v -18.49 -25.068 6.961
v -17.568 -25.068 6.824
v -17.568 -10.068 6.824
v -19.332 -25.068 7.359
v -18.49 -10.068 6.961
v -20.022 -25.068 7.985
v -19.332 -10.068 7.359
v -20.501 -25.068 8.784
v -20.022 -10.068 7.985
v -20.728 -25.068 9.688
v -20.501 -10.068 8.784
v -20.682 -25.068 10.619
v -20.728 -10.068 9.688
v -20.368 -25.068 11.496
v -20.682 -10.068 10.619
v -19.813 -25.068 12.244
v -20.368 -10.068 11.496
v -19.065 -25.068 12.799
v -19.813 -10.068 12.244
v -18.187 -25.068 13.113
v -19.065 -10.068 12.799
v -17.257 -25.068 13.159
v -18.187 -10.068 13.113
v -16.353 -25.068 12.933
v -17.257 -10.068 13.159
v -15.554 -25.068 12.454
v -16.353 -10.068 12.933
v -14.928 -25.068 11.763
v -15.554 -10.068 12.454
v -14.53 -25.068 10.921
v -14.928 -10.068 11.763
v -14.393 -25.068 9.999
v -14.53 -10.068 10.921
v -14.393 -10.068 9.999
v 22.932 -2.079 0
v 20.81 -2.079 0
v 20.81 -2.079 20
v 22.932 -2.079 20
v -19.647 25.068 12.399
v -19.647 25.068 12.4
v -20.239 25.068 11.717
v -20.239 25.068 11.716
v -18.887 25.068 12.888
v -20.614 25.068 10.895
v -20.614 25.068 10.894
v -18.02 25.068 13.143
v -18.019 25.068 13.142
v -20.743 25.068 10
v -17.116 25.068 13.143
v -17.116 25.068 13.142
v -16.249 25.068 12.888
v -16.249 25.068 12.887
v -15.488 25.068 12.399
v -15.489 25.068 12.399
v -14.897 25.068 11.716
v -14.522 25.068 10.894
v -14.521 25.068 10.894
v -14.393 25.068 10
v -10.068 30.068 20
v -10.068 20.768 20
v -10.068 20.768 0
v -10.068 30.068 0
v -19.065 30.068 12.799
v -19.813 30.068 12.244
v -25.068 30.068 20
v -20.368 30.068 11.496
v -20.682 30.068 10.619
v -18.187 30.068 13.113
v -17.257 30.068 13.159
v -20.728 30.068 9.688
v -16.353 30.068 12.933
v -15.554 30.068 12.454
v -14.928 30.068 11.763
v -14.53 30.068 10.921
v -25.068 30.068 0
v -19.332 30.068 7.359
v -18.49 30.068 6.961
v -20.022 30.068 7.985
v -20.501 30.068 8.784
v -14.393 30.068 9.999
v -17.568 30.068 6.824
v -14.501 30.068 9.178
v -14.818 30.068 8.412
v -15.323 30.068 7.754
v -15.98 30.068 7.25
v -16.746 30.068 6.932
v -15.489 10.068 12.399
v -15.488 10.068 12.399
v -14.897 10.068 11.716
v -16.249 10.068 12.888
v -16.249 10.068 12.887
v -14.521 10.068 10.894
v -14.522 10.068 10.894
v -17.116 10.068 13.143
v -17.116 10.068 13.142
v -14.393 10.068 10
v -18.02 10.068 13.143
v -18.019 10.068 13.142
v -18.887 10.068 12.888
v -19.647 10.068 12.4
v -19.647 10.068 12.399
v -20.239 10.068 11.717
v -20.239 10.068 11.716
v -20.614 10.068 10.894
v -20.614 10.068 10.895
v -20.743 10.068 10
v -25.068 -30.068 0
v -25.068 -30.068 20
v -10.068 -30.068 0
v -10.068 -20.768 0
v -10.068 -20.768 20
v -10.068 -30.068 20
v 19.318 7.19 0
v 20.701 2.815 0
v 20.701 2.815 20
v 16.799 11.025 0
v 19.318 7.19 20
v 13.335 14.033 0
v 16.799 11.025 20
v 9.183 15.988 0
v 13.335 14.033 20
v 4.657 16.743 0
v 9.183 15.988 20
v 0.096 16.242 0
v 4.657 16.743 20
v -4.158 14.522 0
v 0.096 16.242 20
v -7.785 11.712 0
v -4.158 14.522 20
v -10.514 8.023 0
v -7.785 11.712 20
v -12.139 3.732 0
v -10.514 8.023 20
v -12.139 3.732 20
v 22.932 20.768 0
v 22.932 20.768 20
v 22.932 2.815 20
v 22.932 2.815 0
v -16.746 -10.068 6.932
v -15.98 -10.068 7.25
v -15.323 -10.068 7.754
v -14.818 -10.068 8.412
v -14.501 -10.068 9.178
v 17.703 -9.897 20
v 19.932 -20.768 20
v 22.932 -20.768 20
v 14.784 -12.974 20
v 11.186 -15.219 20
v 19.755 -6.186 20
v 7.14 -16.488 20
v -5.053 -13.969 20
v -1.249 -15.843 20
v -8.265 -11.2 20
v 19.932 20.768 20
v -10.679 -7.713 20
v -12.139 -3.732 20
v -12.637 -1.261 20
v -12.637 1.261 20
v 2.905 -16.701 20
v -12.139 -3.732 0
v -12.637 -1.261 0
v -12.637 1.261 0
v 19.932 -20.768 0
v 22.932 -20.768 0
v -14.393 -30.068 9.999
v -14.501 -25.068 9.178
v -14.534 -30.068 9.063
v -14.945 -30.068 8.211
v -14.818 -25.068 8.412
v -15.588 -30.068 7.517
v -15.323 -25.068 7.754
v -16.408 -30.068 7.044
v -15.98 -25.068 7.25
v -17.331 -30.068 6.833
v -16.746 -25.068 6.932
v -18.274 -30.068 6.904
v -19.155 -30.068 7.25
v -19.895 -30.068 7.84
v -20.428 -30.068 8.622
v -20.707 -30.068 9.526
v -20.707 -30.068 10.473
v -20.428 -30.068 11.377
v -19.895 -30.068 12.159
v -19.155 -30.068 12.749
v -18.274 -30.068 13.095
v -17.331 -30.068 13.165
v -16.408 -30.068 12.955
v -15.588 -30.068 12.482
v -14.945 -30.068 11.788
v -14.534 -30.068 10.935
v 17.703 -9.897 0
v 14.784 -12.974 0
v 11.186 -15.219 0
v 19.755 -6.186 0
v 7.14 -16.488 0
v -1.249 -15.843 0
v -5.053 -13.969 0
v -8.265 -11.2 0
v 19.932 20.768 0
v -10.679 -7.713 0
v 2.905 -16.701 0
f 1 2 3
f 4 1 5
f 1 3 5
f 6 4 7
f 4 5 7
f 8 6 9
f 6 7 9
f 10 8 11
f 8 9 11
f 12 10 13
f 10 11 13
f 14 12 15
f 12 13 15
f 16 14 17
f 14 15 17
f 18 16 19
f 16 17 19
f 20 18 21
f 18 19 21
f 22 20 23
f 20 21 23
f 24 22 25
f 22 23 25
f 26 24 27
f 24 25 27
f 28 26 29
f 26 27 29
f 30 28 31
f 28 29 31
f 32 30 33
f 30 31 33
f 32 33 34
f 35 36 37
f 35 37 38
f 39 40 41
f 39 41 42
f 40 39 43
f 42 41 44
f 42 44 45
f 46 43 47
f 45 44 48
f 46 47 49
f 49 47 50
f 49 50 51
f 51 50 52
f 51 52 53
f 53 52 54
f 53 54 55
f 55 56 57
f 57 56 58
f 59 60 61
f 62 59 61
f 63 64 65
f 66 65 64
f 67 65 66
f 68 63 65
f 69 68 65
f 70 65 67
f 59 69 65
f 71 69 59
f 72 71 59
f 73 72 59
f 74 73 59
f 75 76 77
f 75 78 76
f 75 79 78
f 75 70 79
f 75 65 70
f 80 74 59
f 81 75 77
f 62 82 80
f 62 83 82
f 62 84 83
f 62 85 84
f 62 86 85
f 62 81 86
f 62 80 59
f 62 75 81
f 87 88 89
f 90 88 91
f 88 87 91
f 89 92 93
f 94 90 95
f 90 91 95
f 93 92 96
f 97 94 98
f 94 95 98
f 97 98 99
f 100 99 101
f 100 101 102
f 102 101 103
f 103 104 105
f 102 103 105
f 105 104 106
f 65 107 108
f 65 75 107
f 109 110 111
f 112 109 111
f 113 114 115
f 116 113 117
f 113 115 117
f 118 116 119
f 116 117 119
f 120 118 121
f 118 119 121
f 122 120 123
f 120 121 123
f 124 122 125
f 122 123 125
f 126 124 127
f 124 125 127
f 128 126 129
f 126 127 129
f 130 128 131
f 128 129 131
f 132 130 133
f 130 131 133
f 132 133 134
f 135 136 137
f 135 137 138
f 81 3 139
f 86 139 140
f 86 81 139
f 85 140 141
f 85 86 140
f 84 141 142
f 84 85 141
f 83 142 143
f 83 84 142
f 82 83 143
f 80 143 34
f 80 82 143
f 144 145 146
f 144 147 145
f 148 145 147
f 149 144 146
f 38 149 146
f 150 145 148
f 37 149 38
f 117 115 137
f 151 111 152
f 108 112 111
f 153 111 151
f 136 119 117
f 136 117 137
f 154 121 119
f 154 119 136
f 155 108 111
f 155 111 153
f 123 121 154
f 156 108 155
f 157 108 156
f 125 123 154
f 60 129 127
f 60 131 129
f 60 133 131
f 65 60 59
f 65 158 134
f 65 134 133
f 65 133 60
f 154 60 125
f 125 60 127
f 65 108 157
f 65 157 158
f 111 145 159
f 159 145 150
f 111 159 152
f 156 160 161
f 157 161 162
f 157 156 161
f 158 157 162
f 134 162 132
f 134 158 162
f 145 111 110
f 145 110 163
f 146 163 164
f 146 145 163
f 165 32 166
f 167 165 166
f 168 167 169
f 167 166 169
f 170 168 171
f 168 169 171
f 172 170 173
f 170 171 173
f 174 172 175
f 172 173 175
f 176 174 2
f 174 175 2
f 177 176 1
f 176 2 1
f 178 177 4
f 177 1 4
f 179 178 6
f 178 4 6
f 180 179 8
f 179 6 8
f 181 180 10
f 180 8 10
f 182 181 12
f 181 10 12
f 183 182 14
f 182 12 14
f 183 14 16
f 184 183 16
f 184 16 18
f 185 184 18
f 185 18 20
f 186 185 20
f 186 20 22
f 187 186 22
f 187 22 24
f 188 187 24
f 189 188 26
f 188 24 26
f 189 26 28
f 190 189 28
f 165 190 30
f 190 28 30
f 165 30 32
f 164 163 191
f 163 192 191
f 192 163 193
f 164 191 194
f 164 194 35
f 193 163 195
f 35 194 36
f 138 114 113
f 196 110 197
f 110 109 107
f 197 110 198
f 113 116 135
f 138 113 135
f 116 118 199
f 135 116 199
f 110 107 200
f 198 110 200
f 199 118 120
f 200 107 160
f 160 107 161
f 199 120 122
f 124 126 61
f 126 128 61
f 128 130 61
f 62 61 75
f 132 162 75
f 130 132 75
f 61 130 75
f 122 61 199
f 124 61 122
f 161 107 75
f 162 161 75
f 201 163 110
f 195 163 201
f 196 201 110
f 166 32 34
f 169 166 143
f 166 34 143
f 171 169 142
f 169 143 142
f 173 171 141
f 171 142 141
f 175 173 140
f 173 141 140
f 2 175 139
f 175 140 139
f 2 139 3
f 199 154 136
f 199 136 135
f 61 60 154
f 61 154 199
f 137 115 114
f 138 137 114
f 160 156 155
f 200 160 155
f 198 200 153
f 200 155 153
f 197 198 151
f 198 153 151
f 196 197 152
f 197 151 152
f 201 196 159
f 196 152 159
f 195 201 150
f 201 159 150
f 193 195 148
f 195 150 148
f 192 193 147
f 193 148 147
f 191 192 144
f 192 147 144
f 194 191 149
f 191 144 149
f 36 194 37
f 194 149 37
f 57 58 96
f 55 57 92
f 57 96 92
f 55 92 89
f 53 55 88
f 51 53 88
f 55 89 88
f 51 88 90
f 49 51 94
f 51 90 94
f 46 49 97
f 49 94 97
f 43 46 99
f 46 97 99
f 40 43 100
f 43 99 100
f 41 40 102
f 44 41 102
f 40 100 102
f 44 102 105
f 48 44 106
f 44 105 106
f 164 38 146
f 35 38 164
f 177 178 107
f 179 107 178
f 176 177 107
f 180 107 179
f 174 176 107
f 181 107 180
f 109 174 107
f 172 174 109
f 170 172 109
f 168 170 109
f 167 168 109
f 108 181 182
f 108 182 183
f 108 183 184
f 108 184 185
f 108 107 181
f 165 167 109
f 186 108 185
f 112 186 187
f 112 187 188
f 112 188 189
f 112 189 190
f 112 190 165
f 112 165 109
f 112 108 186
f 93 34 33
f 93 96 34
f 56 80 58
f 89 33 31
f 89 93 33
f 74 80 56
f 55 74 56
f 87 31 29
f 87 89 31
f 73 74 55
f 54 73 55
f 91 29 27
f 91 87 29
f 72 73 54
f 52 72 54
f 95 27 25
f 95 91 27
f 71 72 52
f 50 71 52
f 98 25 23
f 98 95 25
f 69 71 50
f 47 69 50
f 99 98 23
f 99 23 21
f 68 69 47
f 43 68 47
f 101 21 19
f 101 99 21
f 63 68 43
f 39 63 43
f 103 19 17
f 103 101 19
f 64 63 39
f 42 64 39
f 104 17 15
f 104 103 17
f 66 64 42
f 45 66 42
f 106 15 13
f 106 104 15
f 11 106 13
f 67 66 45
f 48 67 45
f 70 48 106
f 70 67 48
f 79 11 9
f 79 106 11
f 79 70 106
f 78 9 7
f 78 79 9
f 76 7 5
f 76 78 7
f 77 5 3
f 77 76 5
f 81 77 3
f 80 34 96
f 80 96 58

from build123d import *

# Parameters (mm, degrees)
CROQUIS1_W              = 40
CROQUIS1_H              = 50.135716494
SALIENTE_EXTRUIR1_DEPTH = 20
CROQUIS2_W              = 25
CROQUIS2_H              = 9.3
CORTAR_EXTRUIR1_DEPTH   = 41.703747176
CROQUIS3_W              = 25
CROQUIS3_H              = 9.3
CORTAR_EXTRUIR2_DEPTH   = 41.703747176
CORTAR_EXTRUIR3_DEPTH   = 41.703747176
CROQUIS5_W              = 12.7
CROQUIS5_H              = 20
TALADRO1_D              = 6.35
TALADRO1_DEPTH          = 15
TALADRO2_D              = 6.35
TALADRO2_DEPTH          = 15
CROQUIS11_W             = 20
CROQUIS11_H             = 12.953152015
CROQUIS11_H_2           = 13.688922843
SALIENTE_EXTRUIR2_DEPTH = 5
CROQUIS12_W             = 15
CROQUIS12_H             = 20
SALIENTE_EXTRUIR3_DEPTH = 5
CORTAR_EXTRUIR4_START   = -76
CROQUIS13_R             = 3.175
CORTAR_EXTRUIR4_DEPTH   = 76
CROQUIS14_W             = 15
CROQUIS14_H             = 20
SALIENTE_EXTRUIR4_DEPTH = 5
CROQUIS15_R             = 3.175
CORTAR_EXTRUIR5_DEPTH   = 72
CROQUIS16_W             = 30
CROQUIS16_H             = 20
SALIENTE_EXTRUIR5_DEPTH = 5
CROQUIS17_W             = 30
CROQUIS17_H             = 20
SALIENTE_EXTRUIR6_DEPTH = 5
CROQUIS20_W             = 20
CROQUIS20_H             = 17.953152015
CROQUIS20_H_2           = 18.688922843
SALIENTE_EXTRUIR7_DEPTH = 3
CROQUIS21_R             = 16.75
CORTAR_EXTRUIR8_DEPTH   = 43


with BuildPart() as part:
    # Croquis1 → Saliente-Extruir1 (new body)
    with BuildSketch(Plane(origin=(0, 0, 0), x_dir=(-1, 0, 0), z_dir=(0, 0, -1))):
        with Locations((5.067858247, 0)):
            Rectangle(CROQUIS1_W, CROQUIS1_H)
    extrude(amount=-SALIENTE_EXTRUIR1_DEPTH)

    # Croquis2 → Cortar-Extruir1 (cut, through all)
    with BuildSketch(Plane.XY.offset(20)):
        with Locations((2.432141753, -20.417858247)):
            Rectangle(CROQUIS2_W, CROQUIS2_H)
    extrude(amount=-CORTAR_EXTRUIR1_DEPTH, mode=Mode.SUBTRACT)

    # Croquis3 → Cortar-Extruir2 (cut, through all)
    with BuildSketch(Plane.XY.offset(20)):
        with Locations((2.432141753, 20.417858247)):
            Rectangle(CROQUIS3_W, CROQUIS3_H)
    extrude(amount=-CORTAR_EXTRUIR2_DEPTH, mode=Mode.SUBTRACT)

    # Croquis4 → Cortar-Extruir3 (cut, through all)
    with BuildSketch(Plane.XY.offset(20)):
        with BuildLine():
            Line((14.932141753, 2.814706232), (12.384160401, 2.814706232))
            ThreePointArc((12.384160401, 2.814706232), (12.694464867, 0.374915654), (12.528688183, -2.078935404))
            Line((12.528688183, -2.078935404), (14.932141753, -2.078935404))
            Line((14.932141753, -2.078935404), (14.932141753, 2.814706232))
        make_face()
    extrude(amount=-CORTAR_EXTRUIR3_DEPTH, mode=Mode.SUBTRACT)

    # Croquis5 → Cortar-Revolución1 (revolve, cut)
    with BuildSketch(Plane.XZ):
        with Locations((6.35, 10)):
            Rectangle(CROQUIS5_W, CROQUIS5_H)
    revolve(axis=Axis((0, 0, 20), (0, 0, -1)), mode=Mode.SUBTRACT)

    # Taladro1
    with Locations(Plane(origin=(0, -25.067858247, 0), x_dir=(-1, 0, 0), z_dir=(0, -1, 0))):
        with Locations((17.567858247, -9.999290914)):
            Hole(TALADRO1_D / 2, depth=TALADRO1_DEPTH)

    # Taladro2
    with Locations(Plane(origin=(0, 25.067858247, 0), x_dir=(1, 0, 0), z_dir=(0, 1, 0))):
        with Locations((-17.567858247, -10)):
            Hole(TALADRO2_D / 2, depth=TALADRO2_DEPTH)

    # Croquis11 → Saliente-Extruir2 (add)
    with BuildSketch(Plane(origin=(14.932141753, 0, 0), x_dir=(0, 0, -1), z_dir=(1, 0, 0))):
        with Locations((-10, 9.29128224)):
            Rectangle(CROQUIS11_W, CROQUIS11_H)
        with Locations((-10, -8.923396826)):
            Rectangle(CROQUIS11_W, CROQUIS11_H_2)
    extrude(amount=SALIENTE_EXTRUIR2_DEPTH)

    # Croquis12 → Saliente-Extruir3 (add)
    with BuildSketch(Plane(origin=(0, 25.067858247, 0), x_dir=(1, 0, 0), z_dir=(0, 1, 0))):
        with Locations((-17.567858247, -10)):
            Rectangle(CROQUIS12_W, CROQUIS12_H)
    extrude(amount=SALIENTE_EXTRUIR3_DEPTH)

    # Croquis13 → Cortar-Extruir4 (cut)
    with BuildSketch(Plane.XZ.offset(25.067858247).offset(CORTAR_EXTRUIR4_START)):
        with Locations(Location((-17.567858247, 9.999290914, 0), (0, 0, 270))):
            Circle(CROQUIS13_R)
    extrude(amount=CORTAR_EXTRUIR4_DEPTH, mode=Mode.SUBTRACT)

    # Croquis14 → Saliente-Extruir4 (add)
    with BuildSketch(Plane.XZ.offset(25.067858247)):
        with Locations((-17.567858247, 10)):
            Rectangle(CROQUIS14_W, CROQUIS14_H)
    extrude(amount=SALIENTE_EXTRUIR4_DEPTH)

    # Croquis15 → Cortar-Extruir5 (cut)
    with BuildSketch(Plane(origin=(0, 30.067858247, 0), x_dir=(1, 0, 0), z_dir=(0, 1, 0))):
        with Locations((-17.567858247, -9.999290914)):
            Circle(CROQUIS15_R)
    extrude(amount=-CORTAR_EXTRUIR5_DEPTH, mode=Mode.SUBTRACT)

    # Croquis16 → Saliente-Extruir5 (add)
    with BuildSketch(Plane(origin=(0, 15.767858247, 0), x_dir=(1, 0, 0), z_dir=(0, 1, 0))):
        with Locations((4.932141753, -10)):
            Rectangle(CROQUIS16_W, CROQUIS16_H)
    extrude(amount=SALIENTE_EXTRUIR5_DEPTH)

    # Croquis17 → Saliente-Extruir6 (add)
    with BuildSketch(Plane.XZ.offset(15.767858247)):
        with Locations((4.932141753, 10)):
            Rectangle(CROQUIS17_W, CROQUIS17_H)
    extrude(amount=SALIENTE_EXTRUIR6_DEPTH)

    # Croquis20 → Saliente-Extruir7 (add)
    with BuildSketch(Plane(origin=(19.932141753, 0, 0), x_dir=(0, 0, -1), z_dir=(1, 0, 0))):
        with Locations((-10, 11.79128224)):
            Rectangle(CROQUIS20_W, CROQUIS20_H)
        with Locations((-10, -11.423396826)):
            Rectangle(CROQUIS20_W, CROQUIS20_H_2)
    extrude(amount=SALIENTE_EXTRUIR7_DEPTH)

    # Croquis21 → Cortar-Extruir8 (cut)
    with BuildSketch(Plane.XY.offset(20)):
        with Locations((4.18967344, 0)):
            Circle(CROQUIS21_R)
    extrude(amount=-CORTAR_EXTRUIR8_DEPTH, mode=Mode.SUBTRACT)


solid = part.part
